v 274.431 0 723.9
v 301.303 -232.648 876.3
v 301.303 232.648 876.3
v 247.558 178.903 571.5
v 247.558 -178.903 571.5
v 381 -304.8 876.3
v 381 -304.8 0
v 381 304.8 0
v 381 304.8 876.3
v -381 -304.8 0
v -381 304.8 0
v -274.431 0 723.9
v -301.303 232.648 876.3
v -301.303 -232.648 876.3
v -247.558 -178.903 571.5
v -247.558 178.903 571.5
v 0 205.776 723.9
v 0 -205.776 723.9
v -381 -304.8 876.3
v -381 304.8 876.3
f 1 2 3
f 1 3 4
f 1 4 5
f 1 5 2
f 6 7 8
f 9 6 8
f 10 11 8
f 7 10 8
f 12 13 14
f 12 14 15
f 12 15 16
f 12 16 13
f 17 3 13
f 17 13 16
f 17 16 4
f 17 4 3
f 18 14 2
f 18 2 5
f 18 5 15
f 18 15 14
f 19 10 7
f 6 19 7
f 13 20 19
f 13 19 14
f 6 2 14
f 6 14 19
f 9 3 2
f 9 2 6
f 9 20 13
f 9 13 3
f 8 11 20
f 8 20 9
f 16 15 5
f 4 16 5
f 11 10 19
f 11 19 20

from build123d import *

# Parameters (mm, degrees)
F0_W     = 762
F0_H     = 609.6
F1_DEPTH = 876.3
F2_W     = 602.6056408882
F2_H     = 465.2958512306
F3_DEPTH = 304.8
F3_TAPER = 10


with BuildPart() as f1:
    # F0 (on Top) → F1 (new body)
    with BuildSketch(Plane.XY):
        Rectangle(F0_W, F0_H)
    extrude(amount=F1_DEPTH)

    # F2 (on face) → F3 (cut)
    with BuildSketch(Plane.XY.offset(876.3)):
        Rectangle(F2_W, F2_H)
    extrude(amount=-F3_DEPTH, taper=F3_TAPER, mode=Mode.SUBTRACT)


solid = f1.part
